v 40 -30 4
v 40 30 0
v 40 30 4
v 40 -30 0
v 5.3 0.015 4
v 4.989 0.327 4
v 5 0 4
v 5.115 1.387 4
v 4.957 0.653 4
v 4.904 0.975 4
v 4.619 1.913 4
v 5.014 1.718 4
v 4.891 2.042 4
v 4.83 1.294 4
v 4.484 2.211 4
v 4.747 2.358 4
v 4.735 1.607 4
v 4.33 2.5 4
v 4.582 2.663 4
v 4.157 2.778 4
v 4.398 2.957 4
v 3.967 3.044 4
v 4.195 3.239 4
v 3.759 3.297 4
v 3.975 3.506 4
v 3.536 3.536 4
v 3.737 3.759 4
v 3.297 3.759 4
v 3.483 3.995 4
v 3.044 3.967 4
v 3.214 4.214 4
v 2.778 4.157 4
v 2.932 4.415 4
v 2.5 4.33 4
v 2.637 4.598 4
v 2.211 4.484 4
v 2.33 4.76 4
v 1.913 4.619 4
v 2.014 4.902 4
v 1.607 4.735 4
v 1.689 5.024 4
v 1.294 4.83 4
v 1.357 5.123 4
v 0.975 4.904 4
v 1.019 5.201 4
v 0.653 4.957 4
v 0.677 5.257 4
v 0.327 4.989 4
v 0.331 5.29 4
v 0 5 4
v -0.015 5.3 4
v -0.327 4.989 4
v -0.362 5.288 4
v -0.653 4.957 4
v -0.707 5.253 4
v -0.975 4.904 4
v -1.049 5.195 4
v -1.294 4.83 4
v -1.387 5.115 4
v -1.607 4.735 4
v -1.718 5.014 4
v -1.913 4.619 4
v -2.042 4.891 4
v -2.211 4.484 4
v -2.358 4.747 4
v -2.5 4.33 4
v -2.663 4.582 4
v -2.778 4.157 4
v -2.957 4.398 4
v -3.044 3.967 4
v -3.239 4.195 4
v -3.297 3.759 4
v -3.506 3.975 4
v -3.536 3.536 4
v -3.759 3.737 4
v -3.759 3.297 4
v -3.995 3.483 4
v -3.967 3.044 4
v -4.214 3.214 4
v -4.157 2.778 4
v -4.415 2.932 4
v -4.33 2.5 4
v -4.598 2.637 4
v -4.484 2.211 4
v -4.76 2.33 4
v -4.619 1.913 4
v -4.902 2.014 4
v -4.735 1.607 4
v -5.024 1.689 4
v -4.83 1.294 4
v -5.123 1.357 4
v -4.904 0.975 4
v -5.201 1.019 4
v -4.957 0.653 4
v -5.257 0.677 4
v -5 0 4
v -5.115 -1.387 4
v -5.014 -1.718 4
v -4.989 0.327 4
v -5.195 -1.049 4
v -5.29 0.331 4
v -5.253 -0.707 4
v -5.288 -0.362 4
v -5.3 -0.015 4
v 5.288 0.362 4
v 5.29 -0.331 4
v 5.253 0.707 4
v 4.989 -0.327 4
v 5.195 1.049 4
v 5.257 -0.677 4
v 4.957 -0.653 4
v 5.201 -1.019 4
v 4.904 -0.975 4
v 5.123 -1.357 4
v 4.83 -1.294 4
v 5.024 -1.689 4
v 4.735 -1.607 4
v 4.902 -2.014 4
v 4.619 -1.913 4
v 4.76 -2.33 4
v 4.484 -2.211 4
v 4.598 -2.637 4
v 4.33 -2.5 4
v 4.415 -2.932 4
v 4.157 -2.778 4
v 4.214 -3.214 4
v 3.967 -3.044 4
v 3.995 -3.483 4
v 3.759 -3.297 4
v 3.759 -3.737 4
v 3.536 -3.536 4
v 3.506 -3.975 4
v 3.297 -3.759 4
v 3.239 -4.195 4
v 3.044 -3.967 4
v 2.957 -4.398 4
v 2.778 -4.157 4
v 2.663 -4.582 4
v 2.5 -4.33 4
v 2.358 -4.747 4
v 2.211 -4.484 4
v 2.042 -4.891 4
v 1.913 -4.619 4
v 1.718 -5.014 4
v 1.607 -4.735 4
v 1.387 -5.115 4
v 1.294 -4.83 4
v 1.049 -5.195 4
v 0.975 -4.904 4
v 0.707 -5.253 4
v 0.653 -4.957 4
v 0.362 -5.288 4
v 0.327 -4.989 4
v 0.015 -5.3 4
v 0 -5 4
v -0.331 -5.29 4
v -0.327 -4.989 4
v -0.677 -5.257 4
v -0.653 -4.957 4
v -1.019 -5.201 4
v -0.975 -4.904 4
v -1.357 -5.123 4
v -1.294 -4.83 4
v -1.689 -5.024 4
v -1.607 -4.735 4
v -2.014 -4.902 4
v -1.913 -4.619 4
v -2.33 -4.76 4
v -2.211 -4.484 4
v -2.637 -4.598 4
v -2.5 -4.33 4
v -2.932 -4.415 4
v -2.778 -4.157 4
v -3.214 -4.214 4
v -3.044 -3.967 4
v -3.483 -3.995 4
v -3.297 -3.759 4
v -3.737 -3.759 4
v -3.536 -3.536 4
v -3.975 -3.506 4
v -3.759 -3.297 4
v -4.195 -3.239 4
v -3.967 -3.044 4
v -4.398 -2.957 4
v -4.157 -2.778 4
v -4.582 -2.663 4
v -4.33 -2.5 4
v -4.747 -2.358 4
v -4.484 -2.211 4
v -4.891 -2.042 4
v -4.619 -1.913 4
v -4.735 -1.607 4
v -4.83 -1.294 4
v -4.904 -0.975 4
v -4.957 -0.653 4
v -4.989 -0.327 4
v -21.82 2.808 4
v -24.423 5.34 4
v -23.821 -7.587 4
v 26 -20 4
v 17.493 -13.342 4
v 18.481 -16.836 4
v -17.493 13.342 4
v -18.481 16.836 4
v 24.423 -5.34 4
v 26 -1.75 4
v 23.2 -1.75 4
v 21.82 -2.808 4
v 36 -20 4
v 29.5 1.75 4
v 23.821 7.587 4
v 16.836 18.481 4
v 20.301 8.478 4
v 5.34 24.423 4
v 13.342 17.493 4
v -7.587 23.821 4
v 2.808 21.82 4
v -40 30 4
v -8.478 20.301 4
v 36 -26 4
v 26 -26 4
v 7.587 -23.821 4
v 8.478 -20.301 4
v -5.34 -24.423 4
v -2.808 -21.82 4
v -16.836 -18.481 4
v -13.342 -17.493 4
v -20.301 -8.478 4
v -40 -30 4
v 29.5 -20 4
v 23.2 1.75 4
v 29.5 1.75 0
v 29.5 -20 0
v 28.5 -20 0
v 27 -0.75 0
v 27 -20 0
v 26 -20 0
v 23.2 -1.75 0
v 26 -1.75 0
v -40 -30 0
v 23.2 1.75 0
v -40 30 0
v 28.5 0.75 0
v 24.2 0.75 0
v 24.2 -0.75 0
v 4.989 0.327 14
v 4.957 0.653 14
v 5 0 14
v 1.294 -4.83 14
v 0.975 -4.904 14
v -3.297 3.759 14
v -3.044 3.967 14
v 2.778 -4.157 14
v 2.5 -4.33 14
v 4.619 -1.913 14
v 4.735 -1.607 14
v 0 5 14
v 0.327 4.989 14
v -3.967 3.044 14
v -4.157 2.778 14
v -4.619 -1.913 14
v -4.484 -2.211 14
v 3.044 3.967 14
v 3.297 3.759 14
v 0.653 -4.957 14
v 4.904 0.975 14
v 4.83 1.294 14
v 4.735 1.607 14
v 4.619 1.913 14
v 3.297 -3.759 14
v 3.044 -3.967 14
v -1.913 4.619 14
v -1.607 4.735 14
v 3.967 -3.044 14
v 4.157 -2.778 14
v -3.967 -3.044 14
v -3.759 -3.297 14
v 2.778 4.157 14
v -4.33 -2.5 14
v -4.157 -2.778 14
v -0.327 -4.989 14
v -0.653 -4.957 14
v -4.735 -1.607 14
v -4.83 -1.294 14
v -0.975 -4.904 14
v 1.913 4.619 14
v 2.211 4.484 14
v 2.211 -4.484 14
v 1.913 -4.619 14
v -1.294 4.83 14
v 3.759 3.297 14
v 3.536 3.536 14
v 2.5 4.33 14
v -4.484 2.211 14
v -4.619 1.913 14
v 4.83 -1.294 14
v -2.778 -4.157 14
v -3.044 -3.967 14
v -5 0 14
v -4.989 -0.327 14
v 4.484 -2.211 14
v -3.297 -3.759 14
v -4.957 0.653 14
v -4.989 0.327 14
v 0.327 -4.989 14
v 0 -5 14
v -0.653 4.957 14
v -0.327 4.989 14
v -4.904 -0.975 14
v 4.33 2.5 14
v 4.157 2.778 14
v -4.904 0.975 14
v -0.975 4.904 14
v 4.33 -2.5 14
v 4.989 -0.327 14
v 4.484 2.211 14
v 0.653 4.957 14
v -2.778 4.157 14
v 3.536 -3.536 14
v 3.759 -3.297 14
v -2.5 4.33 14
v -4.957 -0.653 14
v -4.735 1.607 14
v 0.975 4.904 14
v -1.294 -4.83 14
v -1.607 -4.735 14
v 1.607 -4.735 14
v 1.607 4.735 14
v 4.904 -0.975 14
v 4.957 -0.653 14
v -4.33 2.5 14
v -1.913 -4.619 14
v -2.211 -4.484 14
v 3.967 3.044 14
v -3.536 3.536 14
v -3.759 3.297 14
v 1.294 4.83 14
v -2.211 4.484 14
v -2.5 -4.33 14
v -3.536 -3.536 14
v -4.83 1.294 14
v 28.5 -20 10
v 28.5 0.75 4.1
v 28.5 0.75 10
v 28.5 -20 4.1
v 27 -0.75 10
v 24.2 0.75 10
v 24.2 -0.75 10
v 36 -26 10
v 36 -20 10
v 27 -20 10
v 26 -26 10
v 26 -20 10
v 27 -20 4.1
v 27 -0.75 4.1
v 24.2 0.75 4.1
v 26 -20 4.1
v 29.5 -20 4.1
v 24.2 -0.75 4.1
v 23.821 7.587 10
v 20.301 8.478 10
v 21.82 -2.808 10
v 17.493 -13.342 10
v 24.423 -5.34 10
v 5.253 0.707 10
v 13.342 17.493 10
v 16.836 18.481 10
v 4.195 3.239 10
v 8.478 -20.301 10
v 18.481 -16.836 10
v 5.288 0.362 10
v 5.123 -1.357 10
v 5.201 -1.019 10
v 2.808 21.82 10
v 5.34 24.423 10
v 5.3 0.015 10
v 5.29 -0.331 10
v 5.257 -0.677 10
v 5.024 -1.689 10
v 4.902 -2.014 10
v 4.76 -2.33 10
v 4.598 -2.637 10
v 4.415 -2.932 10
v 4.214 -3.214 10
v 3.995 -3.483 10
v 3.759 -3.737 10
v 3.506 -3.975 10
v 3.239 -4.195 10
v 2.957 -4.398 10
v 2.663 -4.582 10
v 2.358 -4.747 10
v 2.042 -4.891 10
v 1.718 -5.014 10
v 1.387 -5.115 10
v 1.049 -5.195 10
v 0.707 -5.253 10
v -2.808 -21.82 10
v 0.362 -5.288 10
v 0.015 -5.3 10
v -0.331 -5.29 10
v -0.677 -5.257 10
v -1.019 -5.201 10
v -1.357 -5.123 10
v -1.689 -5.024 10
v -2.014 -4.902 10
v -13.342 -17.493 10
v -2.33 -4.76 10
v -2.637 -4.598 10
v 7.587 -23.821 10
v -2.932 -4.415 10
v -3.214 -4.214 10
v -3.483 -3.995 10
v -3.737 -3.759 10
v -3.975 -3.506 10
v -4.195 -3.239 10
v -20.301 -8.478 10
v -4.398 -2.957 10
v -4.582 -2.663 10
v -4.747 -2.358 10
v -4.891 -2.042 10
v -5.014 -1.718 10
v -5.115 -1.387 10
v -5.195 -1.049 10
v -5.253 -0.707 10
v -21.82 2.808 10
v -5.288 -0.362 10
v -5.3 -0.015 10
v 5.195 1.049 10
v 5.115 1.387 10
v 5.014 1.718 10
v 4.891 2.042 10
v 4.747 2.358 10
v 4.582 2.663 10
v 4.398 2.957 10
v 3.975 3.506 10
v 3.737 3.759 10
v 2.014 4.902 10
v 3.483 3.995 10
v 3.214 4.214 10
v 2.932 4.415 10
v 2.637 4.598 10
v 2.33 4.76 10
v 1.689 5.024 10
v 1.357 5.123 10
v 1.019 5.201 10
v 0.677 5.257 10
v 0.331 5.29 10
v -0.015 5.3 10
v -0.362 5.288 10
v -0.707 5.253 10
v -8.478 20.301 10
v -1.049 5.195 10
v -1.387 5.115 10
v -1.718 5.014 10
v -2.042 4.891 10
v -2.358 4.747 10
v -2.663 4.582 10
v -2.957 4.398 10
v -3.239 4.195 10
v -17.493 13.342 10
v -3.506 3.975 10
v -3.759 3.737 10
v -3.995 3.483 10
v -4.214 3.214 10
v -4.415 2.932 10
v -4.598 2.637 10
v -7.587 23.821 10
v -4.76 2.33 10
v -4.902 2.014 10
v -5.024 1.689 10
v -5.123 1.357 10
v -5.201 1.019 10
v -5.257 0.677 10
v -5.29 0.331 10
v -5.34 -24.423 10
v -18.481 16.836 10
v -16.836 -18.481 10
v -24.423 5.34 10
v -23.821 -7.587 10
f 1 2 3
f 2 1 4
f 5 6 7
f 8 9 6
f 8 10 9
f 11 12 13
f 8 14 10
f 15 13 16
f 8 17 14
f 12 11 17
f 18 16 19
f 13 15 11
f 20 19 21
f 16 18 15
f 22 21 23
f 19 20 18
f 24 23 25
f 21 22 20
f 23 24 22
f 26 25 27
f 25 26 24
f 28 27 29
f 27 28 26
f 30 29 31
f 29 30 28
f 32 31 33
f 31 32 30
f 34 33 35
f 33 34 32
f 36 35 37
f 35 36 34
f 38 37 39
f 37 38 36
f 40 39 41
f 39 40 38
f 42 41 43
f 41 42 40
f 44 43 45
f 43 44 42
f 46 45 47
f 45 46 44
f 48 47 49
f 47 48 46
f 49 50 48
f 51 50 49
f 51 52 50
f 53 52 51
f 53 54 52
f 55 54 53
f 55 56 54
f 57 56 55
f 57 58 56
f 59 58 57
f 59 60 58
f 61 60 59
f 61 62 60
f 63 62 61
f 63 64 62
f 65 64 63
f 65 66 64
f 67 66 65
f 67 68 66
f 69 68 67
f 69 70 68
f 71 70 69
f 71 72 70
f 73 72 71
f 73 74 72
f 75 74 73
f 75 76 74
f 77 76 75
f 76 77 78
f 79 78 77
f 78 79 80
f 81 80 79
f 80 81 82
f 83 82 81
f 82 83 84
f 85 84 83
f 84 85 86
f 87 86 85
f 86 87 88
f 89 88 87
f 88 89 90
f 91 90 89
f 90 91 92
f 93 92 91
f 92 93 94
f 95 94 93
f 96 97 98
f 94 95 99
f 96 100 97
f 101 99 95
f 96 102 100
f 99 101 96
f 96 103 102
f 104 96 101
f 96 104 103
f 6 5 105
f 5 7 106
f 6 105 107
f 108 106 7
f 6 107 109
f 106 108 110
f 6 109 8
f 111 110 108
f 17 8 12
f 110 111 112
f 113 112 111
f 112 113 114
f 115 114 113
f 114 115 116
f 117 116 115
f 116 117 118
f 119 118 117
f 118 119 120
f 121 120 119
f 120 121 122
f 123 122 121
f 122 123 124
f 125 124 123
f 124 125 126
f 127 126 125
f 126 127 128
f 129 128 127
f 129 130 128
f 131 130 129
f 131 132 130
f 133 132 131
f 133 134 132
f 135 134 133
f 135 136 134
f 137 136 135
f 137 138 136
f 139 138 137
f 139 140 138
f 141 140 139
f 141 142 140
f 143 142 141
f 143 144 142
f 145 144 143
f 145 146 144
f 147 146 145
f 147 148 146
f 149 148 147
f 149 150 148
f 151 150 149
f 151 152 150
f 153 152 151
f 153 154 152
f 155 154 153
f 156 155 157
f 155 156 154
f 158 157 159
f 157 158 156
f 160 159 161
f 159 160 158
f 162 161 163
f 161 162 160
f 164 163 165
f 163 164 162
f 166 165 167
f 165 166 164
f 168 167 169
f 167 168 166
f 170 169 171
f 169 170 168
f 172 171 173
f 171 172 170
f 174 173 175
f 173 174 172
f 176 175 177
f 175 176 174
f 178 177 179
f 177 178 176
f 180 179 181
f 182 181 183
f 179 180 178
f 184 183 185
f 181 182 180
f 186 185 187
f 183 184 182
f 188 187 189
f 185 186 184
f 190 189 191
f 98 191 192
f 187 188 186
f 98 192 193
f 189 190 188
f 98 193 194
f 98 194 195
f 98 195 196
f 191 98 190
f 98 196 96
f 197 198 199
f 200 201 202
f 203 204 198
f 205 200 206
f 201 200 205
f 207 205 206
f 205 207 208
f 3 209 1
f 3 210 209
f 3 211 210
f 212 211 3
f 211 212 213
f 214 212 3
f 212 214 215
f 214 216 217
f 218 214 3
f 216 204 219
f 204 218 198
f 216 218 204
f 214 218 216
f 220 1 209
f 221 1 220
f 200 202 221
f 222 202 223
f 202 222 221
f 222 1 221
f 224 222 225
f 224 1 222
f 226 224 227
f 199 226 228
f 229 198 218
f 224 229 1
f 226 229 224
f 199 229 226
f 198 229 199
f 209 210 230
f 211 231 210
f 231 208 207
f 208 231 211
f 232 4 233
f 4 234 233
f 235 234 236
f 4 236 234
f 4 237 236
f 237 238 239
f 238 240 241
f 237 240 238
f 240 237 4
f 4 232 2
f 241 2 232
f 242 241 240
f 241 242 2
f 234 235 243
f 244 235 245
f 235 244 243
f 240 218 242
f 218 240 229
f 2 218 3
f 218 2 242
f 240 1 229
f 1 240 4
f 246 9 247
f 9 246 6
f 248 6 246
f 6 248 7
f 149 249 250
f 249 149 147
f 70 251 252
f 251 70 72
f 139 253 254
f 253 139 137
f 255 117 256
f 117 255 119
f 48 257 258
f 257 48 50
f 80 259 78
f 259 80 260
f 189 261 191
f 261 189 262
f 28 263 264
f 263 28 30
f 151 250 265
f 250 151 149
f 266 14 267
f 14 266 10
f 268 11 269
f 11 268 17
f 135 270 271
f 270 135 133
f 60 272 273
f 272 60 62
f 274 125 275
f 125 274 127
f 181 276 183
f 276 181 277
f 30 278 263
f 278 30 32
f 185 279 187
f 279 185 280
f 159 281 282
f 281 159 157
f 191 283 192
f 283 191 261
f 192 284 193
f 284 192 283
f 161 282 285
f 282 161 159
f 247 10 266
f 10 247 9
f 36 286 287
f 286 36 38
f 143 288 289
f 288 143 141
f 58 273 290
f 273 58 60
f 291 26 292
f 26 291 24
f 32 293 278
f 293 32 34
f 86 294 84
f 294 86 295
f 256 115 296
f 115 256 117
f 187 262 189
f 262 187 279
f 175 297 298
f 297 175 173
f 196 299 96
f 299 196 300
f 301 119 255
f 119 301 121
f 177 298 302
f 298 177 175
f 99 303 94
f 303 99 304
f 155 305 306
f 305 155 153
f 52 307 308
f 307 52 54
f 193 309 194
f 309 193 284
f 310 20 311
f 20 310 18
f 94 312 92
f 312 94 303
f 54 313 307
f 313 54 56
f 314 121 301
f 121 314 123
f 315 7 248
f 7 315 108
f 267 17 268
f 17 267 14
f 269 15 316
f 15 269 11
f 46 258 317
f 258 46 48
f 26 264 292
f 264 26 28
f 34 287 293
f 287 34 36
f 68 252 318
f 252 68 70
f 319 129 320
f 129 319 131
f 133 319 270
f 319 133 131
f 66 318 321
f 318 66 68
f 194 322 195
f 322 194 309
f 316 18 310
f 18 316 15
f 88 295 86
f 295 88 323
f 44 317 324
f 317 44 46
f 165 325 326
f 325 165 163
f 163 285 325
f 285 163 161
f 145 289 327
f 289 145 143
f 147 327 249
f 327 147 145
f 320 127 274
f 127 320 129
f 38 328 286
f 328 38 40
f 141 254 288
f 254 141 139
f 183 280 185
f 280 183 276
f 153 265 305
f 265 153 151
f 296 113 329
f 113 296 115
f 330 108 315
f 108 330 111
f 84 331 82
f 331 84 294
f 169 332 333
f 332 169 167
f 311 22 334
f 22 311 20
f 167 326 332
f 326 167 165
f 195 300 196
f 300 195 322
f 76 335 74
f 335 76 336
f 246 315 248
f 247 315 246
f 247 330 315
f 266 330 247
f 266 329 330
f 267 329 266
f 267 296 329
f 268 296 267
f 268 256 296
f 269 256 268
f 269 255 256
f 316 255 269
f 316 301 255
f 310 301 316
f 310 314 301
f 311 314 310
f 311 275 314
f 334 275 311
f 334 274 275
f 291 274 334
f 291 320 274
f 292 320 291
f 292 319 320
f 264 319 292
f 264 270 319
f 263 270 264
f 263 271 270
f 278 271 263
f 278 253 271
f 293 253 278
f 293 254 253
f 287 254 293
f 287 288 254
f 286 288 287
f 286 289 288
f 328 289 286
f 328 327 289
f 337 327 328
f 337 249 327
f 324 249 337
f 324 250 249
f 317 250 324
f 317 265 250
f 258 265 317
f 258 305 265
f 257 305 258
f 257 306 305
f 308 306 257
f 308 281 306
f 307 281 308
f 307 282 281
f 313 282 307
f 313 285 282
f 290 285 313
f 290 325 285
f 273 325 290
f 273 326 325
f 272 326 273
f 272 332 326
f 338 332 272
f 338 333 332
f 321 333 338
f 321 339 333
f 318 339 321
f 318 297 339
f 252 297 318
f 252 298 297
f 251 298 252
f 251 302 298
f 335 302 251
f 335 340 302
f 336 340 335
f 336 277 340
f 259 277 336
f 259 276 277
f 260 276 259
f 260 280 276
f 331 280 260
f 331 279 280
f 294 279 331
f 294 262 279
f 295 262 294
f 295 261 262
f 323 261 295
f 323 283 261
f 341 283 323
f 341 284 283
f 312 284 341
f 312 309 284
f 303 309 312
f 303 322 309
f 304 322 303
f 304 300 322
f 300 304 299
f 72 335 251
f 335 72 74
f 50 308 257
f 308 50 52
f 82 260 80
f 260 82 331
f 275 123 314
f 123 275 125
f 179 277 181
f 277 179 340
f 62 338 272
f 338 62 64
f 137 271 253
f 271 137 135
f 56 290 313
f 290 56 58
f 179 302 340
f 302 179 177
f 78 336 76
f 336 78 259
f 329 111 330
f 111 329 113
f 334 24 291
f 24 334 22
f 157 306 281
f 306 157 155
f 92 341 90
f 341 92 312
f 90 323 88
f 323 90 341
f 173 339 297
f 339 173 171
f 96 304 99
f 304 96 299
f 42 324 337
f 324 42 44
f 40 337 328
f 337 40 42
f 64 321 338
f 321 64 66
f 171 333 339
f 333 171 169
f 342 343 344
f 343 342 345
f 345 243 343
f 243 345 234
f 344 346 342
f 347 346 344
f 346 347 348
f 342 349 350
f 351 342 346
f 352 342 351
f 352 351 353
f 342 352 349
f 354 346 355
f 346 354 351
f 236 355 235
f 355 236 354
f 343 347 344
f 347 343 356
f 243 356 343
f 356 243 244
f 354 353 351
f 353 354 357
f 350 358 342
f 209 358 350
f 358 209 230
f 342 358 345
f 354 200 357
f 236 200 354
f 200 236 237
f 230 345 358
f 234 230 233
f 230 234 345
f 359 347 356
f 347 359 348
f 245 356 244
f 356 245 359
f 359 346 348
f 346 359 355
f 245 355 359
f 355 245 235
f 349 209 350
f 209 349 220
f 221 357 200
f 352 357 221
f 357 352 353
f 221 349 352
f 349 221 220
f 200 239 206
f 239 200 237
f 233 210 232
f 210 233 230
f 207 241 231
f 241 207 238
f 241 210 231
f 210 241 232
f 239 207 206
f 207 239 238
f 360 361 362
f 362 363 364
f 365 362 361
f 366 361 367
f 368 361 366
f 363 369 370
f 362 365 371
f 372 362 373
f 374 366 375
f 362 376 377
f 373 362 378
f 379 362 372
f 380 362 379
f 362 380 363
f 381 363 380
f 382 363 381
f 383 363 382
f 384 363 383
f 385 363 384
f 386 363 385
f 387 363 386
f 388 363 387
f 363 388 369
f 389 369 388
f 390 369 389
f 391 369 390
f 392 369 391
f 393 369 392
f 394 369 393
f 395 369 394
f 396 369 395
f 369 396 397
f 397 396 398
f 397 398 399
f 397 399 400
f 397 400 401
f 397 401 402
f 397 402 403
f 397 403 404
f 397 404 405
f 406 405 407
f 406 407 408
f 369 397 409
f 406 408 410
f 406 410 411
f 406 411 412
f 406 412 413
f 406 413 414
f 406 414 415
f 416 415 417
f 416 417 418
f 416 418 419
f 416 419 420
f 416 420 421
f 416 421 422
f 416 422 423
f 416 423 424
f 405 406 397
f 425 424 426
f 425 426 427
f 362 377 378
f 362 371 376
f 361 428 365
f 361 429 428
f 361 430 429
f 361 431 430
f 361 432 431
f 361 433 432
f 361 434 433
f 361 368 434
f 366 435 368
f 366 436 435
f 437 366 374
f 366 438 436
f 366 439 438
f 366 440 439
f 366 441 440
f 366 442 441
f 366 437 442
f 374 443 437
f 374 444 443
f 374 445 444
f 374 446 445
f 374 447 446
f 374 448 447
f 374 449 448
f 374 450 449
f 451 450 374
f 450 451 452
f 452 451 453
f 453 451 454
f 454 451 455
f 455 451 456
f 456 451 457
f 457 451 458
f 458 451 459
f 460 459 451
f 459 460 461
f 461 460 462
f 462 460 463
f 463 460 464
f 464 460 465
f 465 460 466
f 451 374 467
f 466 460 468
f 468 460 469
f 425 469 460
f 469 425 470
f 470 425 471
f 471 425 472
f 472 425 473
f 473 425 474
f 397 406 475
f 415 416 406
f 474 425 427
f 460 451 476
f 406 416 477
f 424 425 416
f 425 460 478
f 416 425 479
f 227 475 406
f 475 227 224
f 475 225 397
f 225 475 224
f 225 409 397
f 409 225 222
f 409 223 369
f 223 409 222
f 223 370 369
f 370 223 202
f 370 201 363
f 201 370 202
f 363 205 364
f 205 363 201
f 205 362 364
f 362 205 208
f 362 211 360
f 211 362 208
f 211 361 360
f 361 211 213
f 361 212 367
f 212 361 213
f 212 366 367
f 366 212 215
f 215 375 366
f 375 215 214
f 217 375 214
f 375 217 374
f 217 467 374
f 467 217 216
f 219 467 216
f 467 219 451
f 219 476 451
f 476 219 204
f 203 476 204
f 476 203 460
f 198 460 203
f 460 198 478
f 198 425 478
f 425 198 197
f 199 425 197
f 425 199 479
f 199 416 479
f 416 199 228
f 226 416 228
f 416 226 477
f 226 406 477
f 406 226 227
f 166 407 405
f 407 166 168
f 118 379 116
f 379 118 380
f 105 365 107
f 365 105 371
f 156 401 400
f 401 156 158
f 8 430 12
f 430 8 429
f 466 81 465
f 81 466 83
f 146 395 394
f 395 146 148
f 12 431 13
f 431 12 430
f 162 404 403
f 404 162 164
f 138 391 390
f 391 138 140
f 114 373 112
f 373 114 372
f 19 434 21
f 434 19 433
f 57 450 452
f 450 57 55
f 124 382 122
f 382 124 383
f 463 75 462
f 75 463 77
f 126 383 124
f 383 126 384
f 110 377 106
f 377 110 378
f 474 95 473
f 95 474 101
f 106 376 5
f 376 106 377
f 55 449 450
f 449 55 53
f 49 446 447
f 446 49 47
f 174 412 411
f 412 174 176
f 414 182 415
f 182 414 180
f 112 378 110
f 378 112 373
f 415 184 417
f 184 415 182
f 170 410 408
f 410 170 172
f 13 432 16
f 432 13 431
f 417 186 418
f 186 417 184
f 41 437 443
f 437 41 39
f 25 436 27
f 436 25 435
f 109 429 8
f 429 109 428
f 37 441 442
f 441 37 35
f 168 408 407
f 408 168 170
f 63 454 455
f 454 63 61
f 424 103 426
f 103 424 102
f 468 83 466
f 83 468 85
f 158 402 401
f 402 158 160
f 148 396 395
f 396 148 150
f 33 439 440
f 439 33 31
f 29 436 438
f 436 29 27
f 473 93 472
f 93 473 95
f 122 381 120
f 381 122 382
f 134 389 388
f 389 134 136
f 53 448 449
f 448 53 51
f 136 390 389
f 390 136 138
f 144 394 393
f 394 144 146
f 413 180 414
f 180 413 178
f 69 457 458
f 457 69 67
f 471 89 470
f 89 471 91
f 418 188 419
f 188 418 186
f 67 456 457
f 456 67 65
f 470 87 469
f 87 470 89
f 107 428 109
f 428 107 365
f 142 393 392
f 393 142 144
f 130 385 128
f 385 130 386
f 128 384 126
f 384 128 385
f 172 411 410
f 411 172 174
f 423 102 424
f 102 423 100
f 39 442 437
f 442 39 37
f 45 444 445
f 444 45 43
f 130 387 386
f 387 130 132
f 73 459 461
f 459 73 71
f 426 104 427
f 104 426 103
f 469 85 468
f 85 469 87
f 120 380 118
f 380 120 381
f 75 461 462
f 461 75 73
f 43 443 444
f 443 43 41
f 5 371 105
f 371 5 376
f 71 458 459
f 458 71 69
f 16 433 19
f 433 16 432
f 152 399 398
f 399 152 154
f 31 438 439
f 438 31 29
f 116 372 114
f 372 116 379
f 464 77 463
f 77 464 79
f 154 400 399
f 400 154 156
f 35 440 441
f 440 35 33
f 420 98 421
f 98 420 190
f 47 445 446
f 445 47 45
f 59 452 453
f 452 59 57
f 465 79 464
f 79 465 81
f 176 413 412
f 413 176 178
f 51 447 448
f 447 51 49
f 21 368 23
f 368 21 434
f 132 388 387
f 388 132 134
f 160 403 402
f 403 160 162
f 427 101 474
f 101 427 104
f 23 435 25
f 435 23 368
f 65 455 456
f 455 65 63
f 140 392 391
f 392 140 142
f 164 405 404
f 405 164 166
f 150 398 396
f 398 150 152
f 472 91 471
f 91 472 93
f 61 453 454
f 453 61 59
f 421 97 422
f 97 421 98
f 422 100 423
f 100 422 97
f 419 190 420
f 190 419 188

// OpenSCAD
cadverify_only = "";
module instance(name, part, unit = 1) {
    echo(cadverify_instance = [name, part, unit]);
    if (cadverify_only == "" || cadverify_only == name) children();
}

// Part selector: base, wheel, assembly
part = "assembly"; // [base, wheel, assembly]

$fn = 96;

// Parameters
Rt = 25;        // wheel tip radius (50mm across)
Rr = 22;        // wheel root radius
Nteeth = 12;
wheel_t = 6;    // wheel thickness
bore_r = 5.3;   // wheel bore radius (post 5.0 + 0.3 clearance)
post_r = 5;
post_h = 14;    // base bottom to post top
base_t = 4;     // base plate thickness
plate_x = 80;
plate_y = 60;
gap_angle = 37.3333333; // gap center for nominal assembly

module wheel() {
    pts = [ for (k=[0:2*Nteeth-1])
        let(i=floor(k/2),
            a = (k%2==0) ? i*360/Nteeth : i*360/Nteeth+25,
            r = (k%2==0) ? Rr : Rt)
        [r*cos(a), r*sin(a)] ];
    difference() {
        linear_extrude(height=wheel_t, convexity=4)
            polygon(pts);
        translate([0,0,-0.1])
            cylinder(h=wheel_t+0.2, r=bore_r);
    }
}

module base() {
    difference() {
        union() {
            // plate
            translate([-plate_x/2, -plate_y/2, 0])
                cube([plate_x, plate_y, base_t]);
            // post
            cylinder(h=post_h, r=post_r);
            // pawl backbone (tall)
            translate([27, -20, 0])
                cube([1.5, 20.75, 10]);
            // pawl finger (tall, radial)
            translate([24.2, -0.75, 0])
                cube([4.3, 1.5, 10]);
            // anchor block (full height fixation)
            translate([26, -26, 0])
                cube([10, 6, 10]);
        }
        // slot voids through plate (z -0.1..4.1)
        translate([26, -20, -0.1]) cube([1, 19.25, 4.2]);      // west of backbone
        translate([28.5, -20, -0.1]) cube([1, 20.75, 4.2]);    // east of backbone
        translate([23.2, 0.75, -0.1]) cube([6.3, 1, 4.2]);      // north
        translate([23.2, -1.75, -0.1]) cube([3.8, 1, 4.2]);     // south of finger tip
        translate([23.2, -1.75, -0.1]) cube([1, 3.5, 4.2]);     // west of tip
    }
}

if (part == "wheel") {
    echo(cadverify_spec = [
        ["bounds", [[-25, -25, 0], [25, 25, 6]]],
        ["bodies", 1],
        ["through_holes", 1],
        ["support_faces", [["bottom", "-z", 1000]]],
        ["overhangs_allowed", []],
        ["copies", 1],
        ["details", [
            ["hub", "material", [[5, 5, 0.5], [10, 10, 5.5]], 0.9],
            ["bore", "hole", [0, 0, 7], [0, 0, -1], [[0, 10.6], [5, 10.6]]],
            ["rim", "thickness", [15, 0, 7], [0, 0, -1], 6],
            ["teeth", "view", [[20, -15, 0], [25, 15, 6]]]
        ]]
    ]);
    wheel();
} else if (part == "base") {
    echo(cadverify_spec = [
        ["bounds", [[-40, -30, 0], [40, 30, 14]]],
        ["bodies", 1],
        ["through_holes", 1],
        ["support_faces", [["bottom", "-z", 4000]]],
        ["overhangs_allowed", []],
        ["copies", 1],
        ["details", [
            ["pawl_arm", "material", [[27.1, -10, 4.1], [28.4, -5, 9.9]], 0.9],
            ["slot", "void", [[26.1, -15, 0.5], [26.9, -5, 3.5]], 0.9],
            ["base_floor", "thickness", [-20, 20, -1], [0, 0, 1], 4],
            ["pawl_tip", "view", [[23, -2, 4], [26, 2, 10]]]
        ]]
    ]);
    base();
} else if (part == "assembly") {
    echo(cadverify_spec = [
        ["bounds", [[-40, -30, 0], [40, 30, 14]]],
        ["support_faces", [["table", "-z", 4000]]],
        ["motions", [
            ["free", ["wheel1"], "rotate", [0, 0, 4], [0, 0, 1], [0, -30],
                ["flex", [["wheel1", "base1", 1.0, "pawl arm bends as tooth passes"]]]],
            ["locked", ["wheel1"], "rotate", [0, 0, 4], [0, 0, 1], [0, 8],
                ["stops", [8]]]
        ]],
        ["assembly_order", [
            [["base1"], [0, 0, 0]],
            [["wheel1"], [0, 0, 1]]
        ]]
    ]);
    instance("base1", "base") base();
    instance("wheel1", "wheel") translate([0, 0, 4]) rotate([0, 0, -gap_angle]) wheel();
}
